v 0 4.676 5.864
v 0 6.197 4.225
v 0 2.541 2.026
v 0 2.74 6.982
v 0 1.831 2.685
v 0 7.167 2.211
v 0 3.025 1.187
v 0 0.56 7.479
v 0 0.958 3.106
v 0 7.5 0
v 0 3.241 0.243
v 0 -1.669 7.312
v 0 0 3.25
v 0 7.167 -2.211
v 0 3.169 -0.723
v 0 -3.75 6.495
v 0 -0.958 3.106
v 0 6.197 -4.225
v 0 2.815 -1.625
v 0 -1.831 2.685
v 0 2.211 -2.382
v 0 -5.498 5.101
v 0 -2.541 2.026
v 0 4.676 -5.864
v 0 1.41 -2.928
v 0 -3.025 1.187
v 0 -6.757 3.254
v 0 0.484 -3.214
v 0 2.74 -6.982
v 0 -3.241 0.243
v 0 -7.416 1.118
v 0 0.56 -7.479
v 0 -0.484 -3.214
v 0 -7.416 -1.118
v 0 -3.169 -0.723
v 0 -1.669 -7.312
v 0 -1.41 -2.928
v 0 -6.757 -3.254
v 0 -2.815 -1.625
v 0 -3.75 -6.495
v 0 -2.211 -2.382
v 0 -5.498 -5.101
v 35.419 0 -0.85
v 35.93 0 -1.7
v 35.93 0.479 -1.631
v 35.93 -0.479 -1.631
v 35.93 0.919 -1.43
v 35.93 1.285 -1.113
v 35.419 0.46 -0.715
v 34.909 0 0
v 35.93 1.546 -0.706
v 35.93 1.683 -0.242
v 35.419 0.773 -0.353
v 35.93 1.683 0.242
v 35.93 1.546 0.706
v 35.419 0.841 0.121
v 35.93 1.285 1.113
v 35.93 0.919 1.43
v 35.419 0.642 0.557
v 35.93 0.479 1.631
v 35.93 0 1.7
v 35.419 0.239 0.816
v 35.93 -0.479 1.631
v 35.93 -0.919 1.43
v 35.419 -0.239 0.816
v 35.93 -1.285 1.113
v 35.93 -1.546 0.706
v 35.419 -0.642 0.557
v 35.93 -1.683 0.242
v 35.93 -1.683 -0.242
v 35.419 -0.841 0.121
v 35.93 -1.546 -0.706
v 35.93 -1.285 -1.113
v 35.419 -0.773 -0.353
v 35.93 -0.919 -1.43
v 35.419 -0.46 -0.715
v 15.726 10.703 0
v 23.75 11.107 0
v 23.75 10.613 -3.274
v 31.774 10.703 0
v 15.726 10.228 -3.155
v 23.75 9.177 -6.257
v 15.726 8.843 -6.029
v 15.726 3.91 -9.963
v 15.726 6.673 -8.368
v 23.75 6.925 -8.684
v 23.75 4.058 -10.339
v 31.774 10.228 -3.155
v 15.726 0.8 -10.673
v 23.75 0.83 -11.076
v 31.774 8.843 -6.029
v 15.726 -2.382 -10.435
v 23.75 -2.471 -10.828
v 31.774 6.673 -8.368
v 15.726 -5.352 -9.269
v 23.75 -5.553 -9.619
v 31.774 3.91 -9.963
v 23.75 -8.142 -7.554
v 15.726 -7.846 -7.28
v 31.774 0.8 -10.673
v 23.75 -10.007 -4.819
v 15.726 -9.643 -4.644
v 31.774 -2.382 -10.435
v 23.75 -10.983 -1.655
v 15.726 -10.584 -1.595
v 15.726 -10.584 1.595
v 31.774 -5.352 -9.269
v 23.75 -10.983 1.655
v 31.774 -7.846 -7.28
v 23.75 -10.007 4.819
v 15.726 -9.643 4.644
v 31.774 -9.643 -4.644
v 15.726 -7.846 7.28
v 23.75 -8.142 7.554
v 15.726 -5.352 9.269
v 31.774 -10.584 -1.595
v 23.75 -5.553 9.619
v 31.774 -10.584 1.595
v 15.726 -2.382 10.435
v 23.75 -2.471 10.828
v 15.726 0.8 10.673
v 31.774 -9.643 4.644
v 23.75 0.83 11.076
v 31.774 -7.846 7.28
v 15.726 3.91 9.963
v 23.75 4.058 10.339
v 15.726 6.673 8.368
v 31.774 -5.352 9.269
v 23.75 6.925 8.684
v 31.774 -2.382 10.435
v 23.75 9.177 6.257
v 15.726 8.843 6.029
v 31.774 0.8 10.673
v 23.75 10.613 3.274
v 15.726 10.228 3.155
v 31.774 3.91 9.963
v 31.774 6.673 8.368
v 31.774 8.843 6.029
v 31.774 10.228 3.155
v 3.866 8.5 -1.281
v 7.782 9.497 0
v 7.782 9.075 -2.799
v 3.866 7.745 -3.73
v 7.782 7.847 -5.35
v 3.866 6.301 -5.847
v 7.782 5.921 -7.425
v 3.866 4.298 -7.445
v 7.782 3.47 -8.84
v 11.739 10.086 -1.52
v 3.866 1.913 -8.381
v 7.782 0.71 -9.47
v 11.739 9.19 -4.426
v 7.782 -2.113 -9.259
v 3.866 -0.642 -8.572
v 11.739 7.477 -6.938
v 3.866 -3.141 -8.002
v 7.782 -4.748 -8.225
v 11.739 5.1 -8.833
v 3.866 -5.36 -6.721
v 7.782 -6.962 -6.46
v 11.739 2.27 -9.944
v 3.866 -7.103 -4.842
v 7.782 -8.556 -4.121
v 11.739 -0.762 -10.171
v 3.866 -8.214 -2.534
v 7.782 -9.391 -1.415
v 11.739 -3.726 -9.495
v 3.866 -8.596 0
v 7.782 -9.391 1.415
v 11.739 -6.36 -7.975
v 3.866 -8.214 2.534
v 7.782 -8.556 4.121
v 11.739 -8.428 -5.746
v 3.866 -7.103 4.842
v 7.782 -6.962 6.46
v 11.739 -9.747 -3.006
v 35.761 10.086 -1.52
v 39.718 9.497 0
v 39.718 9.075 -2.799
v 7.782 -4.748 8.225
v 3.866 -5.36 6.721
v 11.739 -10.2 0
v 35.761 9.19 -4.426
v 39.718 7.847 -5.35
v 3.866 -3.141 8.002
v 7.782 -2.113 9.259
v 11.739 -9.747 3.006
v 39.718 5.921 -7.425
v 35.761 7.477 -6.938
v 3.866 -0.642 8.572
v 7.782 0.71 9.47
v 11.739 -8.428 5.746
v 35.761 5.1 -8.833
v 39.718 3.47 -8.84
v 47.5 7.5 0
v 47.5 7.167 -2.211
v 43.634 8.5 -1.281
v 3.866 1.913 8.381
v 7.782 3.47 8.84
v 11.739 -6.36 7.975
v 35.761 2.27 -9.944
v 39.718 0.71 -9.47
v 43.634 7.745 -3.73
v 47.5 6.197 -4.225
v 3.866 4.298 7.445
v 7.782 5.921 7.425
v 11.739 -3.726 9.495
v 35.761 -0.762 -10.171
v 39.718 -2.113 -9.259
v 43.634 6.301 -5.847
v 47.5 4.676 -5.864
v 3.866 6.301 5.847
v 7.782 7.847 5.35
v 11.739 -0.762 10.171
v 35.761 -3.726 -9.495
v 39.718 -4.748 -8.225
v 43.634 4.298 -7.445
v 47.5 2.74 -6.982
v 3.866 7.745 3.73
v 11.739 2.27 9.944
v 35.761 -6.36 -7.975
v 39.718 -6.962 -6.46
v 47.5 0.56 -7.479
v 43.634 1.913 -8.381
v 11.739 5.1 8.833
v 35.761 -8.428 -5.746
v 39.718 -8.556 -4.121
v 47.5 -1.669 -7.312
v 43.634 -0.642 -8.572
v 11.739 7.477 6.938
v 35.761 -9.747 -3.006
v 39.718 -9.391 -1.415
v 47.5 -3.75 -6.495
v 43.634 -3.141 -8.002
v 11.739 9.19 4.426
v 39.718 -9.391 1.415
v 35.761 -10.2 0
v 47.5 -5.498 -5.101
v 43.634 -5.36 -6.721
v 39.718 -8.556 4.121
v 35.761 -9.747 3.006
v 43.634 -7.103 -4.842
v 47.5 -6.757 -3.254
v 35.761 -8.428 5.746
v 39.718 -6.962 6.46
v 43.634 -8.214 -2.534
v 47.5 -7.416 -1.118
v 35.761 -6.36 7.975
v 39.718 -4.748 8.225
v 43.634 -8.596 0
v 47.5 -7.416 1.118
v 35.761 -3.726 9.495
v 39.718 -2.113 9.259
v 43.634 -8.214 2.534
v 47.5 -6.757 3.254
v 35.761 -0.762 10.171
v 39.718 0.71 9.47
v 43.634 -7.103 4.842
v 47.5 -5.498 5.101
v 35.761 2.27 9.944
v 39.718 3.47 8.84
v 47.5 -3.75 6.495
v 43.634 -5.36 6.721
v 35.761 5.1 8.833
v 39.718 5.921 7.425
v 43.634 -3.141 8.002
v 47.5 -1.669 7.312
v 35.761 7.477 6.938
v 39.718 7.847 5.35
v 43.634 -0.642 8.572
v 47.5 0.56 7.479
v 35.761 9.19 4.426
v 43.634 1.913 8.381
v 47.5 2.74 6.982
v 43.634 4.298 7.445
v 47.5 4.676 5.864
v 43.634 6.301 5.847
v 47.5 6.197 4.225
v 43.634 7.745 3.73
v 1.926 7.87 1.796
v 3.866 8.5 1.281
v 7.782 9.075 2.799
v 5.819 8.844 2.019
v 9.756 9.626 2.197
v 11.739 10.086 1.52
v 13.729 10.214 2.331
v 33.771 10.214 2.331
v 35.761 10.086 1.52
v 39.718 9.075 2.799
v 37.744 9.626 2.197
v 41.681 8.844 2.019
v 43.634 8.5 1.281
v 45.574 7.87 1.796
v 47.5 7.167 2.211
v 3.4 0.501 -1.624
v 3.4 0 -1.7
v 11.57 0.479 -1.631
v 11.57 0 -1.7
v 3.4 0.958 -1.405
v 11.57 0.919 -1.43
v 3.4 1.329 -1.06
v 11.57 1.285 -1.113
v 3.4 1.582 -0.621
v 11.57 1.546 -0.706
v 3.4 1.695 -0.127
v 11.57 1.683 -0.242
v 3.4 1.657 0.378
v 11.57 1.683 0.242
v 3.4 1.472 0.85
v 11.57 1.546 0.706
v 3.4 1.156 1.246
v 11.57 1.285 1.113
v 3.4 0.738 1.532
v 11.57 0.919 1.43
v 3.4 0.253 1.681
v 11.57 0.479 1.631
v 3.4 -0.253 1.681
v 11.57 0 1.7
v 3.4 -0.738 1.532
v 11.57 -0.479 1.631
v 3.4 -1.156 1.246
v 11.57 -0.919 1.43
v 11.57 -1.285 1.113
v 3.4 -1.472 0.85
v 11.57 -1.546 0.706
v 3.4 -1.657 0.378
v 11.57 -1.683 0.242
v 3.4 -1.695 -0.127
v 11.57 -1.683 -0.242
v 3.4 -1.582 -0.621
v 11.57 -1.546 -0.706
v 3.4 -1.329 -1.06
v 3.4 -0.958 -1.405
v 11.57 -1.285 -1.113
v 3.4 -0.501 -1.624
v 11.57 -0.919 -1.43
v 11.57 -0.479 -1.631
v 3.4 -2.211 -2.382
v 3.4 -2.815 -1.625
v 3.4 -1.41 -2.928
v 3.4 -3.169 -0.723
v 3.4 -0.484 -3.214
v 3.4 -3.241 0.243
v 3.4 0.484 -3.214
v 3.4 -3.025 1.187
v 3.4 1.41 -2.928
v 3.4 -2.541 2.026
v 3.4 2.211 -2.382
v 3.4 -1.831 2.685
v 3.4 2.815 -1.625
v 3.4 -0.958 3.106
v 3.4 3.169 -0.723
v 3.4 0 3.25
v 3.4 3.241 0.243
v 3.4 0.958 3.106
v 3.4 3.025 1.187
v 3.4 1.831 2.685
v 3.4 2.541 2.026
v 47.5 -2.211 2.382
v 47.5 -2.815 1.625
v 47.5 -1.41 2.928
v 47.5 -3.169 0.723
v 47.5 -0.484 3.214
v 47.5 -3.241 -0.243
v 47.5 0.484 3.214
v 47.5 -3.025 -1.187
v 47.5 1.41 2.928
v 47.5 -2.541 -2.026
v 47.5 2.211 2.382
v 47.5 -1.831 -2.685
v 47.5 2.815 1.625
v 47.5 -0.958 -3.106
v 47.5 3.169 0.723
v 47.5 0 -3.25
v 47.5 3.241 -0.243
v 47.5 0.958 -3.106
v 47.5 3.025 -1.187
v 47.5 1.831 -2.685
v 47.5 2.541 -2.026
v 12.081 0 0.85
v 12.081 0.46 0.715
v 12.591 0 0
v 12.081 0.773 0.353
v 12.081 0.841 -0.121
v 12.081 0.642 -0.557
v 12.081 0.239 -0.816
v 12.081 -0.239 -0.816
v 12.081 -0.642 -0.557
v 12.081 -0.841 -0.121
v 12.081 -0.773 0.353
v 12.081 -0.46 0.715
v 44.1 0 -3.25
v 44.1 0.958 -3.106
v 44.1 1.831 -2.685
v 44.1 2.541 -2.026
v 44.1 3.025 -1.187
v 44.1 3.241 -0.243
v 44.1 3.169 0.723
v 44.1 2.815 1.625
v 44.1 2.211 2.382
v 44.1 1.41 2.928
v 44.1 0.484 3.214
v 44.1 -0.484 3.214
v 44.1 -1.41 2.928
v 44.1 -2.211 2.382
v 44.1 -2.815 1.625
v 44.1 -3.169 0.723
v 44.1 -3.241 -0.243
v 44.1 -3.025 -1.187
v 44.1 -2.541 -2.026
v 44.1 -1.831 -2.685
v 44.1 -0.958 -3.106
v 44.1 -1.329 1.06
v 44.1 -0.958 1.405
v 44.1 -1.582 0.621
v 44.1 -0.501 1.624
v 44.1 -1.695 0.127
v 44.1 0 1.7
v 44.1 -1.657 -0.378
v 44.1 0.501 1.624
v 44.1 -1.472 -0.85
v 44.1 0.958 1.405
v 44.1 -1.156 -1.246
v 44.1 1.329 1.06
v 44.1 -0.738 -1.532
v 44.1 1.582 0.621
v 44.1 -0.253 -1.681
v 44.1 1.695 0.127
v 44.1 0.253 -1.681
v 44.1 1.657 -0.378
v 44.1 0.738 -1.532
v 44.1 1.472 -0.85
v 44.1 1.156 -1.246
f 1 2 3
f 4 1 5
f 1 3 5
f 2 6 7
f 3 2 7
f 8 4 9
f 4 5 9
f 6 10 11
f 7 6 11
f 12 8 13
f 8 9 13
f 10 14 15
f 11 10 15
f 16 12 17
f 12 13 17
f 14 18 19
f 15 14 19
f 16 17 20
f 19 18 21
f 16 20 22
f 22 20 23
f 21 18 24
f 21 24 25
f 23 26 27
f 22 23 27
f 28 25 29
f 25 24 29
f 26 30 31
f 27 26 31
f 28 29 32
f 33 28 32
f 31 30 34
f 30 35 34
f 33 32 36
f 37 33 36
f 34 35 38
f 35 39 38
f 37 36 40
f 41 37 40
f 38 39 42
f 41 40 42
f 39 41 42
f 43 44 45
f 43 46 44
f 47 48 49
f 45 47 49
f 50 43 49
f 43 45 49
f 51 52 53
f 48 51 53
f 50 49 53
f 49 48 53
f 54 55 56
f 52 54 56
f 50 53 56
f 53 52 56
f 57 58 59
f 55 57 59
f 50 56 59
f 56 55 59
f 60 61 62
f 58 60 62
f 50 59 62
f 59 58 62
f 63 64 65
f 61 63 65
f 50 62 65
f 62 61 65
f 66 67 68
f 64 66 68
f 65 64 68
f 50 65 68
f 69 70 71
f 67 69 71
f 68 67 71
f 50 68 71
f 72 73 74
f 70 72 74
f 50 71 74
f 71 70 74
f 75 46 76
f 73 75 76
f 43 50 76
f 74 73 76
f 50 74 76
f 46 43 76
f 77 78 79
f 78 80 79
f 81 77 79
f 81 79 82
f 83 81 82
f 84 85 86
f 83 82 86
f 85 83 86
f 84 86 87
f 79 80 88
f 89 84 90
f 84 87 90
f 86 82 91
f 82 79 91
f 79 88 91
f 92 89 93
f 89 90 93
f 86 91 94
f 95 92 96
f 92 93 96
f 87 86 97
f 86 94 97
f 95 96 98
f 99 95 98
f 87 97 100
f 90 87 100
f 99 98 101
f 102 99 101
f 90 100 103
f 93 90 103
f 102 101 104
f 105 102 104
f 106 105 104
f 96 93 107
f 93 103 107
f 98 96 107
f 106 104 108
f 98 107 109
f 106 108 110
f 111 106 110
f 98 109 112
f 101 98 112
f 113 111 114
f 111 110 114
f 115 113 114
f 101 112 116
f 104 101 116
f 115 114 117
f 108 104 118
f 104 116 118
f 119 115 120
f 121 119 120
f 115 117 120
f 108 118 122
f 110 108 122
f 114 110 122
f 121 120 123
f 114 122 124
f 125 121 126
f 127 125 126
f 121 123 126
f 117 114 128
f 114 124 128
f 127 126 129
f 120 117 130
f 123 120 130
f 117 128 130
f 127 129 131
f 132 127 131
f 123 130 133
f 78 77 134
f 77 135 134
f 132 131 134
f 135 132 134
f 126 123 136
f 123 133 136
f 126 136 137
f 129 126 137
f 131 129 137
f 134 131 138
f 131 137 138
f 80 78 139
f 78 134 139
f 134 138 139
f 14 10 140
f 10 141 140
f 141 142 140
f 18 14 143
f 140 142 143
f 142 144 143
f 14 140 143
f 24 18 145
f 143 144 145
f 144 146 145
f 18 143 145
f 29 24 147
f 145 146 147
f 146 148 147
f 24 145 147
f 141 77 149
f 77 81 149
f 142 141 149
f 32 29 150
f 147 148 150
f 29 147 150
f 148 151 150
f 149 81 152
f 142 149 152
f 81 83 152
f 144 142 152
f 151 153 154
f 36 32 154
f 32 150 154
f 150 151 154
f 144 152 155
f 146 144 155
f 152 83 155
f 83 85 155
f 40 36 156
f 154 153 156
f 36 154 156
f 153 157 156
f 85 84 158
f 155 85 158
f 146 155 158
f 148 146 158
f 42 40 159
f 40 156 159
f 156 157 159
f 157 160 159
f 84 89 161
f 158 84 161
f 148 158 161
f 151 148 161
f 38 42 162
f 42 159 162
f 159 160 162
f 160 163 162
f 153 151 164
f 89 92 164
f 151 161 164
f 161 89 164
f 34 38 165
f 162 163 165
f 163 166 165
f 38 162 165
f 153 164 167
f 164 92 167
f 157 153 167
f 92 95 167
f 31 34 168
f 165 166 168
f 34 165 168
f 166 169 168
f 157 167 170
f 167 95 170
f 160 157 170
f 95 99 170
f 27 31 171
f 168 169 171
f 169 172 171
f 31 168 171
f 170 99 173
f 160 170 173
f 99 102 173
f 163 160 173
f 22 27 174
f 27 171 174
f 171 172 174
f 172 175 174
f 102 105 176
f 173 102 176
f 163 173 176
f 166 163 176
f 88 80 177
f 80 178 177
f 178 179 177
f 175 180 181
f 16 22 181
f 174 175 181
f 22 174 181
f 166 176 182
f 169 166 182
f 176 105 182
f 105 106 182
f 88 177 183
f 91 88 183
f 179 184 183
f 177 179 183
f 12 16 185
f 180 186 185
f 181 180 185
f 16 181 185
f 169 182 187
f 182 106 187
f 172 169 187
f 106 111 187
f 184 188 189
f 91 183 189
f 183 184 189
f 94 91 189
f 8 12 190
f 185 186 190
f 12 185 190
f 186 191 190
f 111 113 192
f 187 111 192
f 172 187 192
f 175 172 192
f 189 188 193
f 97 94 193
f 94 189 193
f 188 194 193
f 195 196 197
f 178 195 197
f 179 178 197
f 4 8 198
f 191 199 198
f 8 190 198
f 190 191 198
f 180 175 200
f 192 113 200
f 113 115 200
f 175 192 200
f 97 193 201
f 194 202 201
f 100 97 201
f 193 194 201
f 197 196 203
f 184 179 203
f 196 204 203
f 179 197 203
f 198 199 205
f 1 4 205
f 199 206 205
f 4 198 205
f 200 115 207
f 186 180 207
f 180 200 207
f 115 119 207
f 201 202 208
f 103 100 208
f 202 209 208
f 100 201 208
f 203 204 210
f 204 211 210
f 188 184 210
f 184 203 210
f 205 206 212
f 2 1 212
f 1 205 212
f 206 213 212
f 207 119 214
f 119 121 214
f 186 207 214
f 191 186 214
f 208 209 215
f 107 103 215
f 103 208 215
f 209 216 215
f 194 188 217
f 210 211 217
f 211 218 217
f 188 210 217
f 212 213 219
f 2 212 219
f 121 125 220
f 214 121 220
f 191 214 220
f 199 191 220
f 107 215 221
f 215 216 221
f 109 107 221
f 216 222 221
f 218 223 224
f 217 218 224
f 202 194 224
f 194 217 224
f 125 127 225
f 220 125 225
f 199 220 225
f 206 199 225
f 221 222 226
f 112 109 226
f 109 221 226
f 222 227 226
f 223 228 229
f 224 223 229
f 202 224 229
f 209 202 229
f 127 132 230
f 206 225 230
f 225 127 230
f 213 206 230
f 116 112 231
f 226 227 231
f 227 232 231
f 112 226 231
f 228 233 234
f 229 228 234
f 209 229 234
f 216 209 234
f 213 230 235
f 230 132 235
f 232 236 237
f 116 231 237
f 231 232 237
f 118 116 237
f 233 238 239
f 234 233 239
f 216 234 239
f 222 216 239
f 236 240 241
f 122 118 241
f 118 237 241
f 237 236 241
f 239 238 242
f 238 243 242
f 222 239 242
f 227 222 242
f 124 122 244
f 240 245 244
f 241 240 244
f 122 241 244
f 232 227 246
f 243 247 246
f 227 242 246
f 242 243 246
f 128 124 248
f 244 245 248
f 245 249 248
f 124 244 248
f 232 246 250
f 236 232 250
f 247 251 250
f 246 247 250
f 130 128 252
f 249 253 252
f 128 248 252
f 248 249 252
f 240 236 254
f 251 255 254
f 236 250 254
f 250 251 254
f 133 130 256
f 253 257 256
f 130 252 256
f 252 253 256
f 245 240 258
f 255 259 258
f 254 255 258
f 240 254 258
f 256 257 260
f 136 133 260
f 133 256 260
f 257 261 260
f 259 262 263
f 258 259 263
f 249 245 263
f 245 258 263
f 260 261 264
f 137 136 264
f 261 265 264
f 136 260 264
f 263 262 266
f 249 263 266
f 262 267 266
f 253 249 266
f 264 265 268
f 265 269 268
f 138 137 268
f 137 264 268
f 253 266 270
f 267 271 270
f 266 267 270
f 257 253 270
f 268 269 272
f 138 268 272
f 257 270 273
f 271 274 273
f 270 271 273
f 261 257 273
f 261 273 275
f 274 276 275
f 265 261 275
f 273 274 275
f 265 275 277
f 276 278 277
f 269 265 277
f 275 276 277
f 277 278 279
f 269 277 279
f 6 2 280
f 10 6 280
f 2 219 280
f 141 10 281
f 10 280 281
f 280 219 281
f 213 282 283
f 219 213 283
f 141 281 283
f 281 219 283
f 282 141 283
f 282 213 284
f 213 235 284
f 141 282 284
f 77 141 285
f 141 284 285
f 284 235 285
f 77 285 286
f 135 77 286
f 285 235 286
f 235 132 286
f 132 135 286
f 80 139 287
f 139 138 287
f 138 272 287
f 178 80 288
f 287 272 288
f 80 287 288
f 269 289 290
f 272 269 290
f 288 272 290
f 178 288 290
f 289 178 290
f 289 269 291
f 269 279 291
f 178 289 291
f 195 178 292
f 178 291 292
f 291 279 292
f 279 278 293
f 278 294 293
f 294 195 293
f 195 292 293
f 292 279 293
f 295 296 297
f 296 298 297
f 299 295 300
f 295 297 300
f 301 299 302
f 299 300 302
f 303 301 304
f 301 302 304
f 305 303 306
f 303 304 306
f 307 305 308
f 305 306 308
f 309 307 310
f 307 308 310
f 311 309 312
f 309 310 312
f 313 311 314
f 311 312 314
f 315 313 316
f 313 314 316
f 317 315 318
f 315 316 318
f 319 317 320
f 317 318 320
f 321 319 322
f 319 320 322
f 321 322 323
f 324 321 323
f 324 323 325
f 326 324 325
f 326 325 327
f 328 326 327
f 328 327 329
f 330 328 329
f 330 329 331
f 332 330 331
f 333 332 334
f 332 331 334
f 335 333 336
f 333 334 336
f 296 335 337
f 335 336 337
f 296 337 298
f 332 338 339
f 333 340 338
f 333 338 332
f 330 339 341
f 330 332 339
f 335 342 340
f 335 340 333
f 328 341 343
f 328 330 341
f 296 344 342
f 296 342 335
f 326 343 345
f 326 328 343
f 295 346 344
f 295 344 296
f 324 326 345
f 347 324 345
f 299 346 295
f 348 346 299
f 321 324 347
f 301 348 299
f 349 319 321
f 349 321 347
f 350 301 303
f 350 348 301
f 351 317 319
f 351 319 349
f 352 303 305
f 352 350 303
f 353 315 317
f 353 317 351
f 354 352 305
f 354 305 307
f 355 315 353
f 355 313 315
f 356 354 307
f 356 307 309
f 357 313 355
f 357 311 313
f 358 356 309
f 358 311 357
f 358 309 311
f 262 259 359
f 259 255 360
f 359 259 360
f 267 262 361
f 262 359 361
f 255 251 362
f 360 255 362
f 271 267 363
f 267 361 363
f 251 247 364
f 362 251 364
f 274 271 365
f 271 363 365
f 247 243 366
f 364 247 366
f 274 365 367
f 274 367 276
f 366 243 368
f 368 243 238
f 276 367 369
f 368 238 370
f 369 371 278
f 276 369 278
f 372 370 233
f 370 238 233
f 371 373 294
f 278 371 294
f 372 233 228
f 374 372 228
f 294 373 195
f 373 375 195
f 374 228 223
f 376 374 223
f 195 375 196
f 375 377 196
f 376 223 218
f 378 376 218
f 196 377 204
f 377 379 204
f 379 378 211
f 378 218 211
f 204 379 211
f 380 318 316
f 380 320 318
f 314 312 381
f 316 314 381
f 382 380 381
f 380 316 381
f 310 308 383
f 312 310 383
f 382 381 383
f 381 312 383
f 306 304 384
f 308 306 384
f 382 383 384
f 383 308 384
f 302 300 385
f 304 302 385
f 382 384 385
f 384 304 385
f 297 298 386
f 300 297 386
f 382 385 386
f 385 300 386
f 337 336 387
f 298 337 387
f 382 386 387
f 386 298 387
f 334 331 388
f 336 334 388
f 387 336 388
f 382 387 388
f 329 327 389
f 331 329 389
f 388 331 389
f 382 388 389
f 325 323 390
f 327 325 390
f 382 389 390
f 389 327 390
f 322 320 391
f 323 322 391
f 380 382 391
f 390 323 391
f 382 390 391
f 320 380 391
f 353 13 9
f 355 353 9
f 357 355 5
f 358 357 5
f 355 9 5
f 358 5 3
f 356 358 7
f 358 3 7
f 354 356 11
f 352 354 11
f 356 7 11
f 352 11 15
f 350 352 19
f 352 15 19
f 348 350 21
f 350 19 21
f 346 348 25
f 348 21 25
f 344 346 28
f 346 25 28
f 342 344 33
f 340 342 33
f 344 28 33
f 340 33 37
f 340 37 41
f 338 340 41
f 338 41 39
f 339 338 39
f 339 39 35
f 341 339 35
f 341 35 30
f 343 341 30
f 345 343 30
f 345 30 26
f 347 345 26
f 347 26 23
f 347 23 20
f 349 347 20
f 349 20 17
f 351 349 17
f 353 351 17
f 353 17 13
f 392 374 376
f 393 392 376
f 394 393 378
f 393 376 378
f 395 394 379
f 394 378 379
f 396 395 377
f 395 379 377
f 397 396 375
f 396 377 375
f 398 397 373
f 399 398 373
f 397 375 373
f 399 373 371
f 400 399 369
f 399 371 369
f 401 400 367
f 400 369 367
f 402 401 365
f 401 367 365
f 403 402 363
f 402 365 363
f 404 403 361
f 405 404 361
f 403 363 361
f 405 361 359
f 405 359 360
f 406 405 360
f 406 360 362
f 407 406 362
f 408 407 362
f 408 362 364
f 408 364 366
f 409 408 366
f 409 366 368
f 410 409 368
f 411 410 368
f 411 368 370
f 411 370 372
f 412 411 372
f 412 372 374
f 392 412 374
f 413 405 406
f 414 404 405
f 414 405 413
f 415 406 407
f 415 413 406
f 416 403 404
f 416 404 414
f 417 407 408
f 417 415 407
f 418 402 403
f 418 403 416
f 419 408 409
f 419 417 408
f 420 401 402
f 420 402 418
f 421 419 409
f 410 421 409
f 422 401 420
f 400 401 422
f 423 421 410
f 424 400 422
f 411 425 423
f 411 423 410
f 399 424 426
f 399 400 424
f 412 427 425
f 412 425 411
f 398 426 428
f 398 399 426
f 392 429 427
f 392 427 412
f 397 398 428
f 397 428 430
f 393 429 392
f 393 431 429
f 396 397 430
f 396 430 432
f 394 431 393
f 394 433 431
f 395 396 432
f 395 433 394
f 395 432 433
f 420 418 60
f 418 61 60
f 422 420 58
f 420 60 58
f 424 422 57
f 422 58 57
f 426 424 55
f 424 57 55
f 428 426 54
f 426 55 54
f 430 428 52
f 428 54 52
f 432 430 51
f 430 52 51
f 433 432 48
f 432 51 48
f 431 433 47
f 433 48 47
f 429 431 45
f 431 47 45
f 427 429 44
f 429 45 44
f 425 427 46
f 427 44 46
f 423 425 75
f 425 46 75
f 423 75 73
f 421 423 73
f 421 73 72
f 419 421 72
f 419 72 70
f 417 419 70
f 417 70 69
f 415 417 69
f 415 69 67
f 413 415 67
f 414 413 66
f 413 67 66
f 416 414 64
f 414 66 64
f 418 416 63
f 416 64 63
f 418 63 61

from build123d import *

# Parameters (mm, degrees)
CBORE_FOR_M3_HEX_SOCKET_HEAD_CAP_SCREW1_D           = 3.4
CBORE_FOR_M3_HEX_SOCKET_HEAD_CAP_SCREW1_DEPTH       = 11.57
CBORE_FOR_M3_HEX_SOCKET_HEAD_CAP_SCREW1_CBORE_D     = 6.5
CBORE_FOR_M3_HEX_SOCKET_HEAD_CAP_SCREW1_CBORE_DEPTH = 3.4
CBORE_FOR_M3_HEX_SOCKET_HEAD_CAP_SCREW1_TIP         = 1.021463052
CBORE_FOR_M3_HEX_SOCKET_HEAD_CAP_SCREW2_D           = 3.4
CBORE_FOR_M3_HEX_SOCKET_HEAD_CAP_SCREW2_DEPTH       = 11.57
CBORE_FOR_M3_HEX_SOCKET_HEAD_CAP_SCREW2_CBORE_D     = 6.5
CBORE_FOR_M3_HEX_SOCKET_HEAD_CAP_SCREW2_CBORE_DEPTH = 3.4
CBORE_FOR_M3_HEX_SOCKET_HEAD_CAP_SCREW2_TIP         = 1.021463052


with BuildPart() as part:
    # Sketch1 → Revolve1 (revolve)
    with BuildSketch(Plane.XY):
        with BuildLine():
            Line((0, 0), (0, 7.5))
            ThreePointArc((0, 7.5), (23.75, 11.106692047), (47.5, 7.5))
            Line((47.5, 7.5), (47.5, 0))
            Line((47.5, 0), (0, 0))
        make_face()
    revolve(axis=Axis((47.5, 0, 0), (-1, 0, 0)))

    # CBORE for M3 Hex Socket Head Cap Screw1
    with Locations(Plane(origin=(47.5, 0, 0), x_dir=(0, 0, -1), z_dir=(1, 0, 0))):
        with Locations((0, 0)):
            CounterBoreHole(CBORE_FOR_M3_HEX_SOCKET_HEAD_CAP_SCREW1_D / 2, CBORE_FOR_M3_HEX_SOCKET_HEAD_CAP_SCREW1_CBORE_D / 2, CBORE_FOR_M3_HEX_SOCKET_HEAD_CAP_SCREW1_CBORE_DEPTH, depth=CBORE_FOR_M3_HEX_SOCKET_HEAD_CAP_SCREW1_DEPTH)
            with Locations((0, 0, -(CBORE_FOR_M3_HEX_SOCKET_HEAD_CAP_SCREW1_DEPTH + CBORE_FOR_M3_HEX_SOCKET_HEAD_CAP_SCREW1_TIP / 2))):  # 118° drill point
                Cone(0, CBORE_FOR_M3_HEX_SOCKET_HEAD_CAP_SCREW1_D / 2, CBORE_FOR_M3_HEX_SOCKET_HEAD_CAP_SCREW1_TIP, mode=Mode.SUBTRACT)

    # CBORE for M3 Hex Socket Head Cap Screw2
    with Locations(Plane.ZY):
        with Locations((0, 0)):
            CounterBoreHole(CBORE_FOR_M3_HEX_SOCKET_HEAD_CAP_SCREW2_D / 2, CBORE_FOR_M3_HEX_SOCKET_HEAD_CAP_SCREW2_CBORE_D / 2, CBORE_FOR_M3_HEX_SOCKET_HEAD_CAP_SCREW2_CBORE_DEPTH, depth=CBORE_FOR_M3_HEX_SOCKET_HEAD_CAP_SCREW2_DEPTH)
            with Locations((0, 0, -(CBORE_FOR_M3_HEX_SOCKET_HEAD_CAP_SCREW2_DEPTH + CBORE_FOR_M3_HEX_SOCKET_HEAD_CAP_SCREW2_TIP / 2))):  # 118° drill point
                Cone(0, CBORE_FOR_M3_HEX_SOCKET_HEAD_CAP_SCREW2_D / 2, CBORE_FOR_M3_HEX_SOCKET_HEAD_CAP_SCREW2_TIP, mode=Mode.SUBTRACT)


solid = part.part
